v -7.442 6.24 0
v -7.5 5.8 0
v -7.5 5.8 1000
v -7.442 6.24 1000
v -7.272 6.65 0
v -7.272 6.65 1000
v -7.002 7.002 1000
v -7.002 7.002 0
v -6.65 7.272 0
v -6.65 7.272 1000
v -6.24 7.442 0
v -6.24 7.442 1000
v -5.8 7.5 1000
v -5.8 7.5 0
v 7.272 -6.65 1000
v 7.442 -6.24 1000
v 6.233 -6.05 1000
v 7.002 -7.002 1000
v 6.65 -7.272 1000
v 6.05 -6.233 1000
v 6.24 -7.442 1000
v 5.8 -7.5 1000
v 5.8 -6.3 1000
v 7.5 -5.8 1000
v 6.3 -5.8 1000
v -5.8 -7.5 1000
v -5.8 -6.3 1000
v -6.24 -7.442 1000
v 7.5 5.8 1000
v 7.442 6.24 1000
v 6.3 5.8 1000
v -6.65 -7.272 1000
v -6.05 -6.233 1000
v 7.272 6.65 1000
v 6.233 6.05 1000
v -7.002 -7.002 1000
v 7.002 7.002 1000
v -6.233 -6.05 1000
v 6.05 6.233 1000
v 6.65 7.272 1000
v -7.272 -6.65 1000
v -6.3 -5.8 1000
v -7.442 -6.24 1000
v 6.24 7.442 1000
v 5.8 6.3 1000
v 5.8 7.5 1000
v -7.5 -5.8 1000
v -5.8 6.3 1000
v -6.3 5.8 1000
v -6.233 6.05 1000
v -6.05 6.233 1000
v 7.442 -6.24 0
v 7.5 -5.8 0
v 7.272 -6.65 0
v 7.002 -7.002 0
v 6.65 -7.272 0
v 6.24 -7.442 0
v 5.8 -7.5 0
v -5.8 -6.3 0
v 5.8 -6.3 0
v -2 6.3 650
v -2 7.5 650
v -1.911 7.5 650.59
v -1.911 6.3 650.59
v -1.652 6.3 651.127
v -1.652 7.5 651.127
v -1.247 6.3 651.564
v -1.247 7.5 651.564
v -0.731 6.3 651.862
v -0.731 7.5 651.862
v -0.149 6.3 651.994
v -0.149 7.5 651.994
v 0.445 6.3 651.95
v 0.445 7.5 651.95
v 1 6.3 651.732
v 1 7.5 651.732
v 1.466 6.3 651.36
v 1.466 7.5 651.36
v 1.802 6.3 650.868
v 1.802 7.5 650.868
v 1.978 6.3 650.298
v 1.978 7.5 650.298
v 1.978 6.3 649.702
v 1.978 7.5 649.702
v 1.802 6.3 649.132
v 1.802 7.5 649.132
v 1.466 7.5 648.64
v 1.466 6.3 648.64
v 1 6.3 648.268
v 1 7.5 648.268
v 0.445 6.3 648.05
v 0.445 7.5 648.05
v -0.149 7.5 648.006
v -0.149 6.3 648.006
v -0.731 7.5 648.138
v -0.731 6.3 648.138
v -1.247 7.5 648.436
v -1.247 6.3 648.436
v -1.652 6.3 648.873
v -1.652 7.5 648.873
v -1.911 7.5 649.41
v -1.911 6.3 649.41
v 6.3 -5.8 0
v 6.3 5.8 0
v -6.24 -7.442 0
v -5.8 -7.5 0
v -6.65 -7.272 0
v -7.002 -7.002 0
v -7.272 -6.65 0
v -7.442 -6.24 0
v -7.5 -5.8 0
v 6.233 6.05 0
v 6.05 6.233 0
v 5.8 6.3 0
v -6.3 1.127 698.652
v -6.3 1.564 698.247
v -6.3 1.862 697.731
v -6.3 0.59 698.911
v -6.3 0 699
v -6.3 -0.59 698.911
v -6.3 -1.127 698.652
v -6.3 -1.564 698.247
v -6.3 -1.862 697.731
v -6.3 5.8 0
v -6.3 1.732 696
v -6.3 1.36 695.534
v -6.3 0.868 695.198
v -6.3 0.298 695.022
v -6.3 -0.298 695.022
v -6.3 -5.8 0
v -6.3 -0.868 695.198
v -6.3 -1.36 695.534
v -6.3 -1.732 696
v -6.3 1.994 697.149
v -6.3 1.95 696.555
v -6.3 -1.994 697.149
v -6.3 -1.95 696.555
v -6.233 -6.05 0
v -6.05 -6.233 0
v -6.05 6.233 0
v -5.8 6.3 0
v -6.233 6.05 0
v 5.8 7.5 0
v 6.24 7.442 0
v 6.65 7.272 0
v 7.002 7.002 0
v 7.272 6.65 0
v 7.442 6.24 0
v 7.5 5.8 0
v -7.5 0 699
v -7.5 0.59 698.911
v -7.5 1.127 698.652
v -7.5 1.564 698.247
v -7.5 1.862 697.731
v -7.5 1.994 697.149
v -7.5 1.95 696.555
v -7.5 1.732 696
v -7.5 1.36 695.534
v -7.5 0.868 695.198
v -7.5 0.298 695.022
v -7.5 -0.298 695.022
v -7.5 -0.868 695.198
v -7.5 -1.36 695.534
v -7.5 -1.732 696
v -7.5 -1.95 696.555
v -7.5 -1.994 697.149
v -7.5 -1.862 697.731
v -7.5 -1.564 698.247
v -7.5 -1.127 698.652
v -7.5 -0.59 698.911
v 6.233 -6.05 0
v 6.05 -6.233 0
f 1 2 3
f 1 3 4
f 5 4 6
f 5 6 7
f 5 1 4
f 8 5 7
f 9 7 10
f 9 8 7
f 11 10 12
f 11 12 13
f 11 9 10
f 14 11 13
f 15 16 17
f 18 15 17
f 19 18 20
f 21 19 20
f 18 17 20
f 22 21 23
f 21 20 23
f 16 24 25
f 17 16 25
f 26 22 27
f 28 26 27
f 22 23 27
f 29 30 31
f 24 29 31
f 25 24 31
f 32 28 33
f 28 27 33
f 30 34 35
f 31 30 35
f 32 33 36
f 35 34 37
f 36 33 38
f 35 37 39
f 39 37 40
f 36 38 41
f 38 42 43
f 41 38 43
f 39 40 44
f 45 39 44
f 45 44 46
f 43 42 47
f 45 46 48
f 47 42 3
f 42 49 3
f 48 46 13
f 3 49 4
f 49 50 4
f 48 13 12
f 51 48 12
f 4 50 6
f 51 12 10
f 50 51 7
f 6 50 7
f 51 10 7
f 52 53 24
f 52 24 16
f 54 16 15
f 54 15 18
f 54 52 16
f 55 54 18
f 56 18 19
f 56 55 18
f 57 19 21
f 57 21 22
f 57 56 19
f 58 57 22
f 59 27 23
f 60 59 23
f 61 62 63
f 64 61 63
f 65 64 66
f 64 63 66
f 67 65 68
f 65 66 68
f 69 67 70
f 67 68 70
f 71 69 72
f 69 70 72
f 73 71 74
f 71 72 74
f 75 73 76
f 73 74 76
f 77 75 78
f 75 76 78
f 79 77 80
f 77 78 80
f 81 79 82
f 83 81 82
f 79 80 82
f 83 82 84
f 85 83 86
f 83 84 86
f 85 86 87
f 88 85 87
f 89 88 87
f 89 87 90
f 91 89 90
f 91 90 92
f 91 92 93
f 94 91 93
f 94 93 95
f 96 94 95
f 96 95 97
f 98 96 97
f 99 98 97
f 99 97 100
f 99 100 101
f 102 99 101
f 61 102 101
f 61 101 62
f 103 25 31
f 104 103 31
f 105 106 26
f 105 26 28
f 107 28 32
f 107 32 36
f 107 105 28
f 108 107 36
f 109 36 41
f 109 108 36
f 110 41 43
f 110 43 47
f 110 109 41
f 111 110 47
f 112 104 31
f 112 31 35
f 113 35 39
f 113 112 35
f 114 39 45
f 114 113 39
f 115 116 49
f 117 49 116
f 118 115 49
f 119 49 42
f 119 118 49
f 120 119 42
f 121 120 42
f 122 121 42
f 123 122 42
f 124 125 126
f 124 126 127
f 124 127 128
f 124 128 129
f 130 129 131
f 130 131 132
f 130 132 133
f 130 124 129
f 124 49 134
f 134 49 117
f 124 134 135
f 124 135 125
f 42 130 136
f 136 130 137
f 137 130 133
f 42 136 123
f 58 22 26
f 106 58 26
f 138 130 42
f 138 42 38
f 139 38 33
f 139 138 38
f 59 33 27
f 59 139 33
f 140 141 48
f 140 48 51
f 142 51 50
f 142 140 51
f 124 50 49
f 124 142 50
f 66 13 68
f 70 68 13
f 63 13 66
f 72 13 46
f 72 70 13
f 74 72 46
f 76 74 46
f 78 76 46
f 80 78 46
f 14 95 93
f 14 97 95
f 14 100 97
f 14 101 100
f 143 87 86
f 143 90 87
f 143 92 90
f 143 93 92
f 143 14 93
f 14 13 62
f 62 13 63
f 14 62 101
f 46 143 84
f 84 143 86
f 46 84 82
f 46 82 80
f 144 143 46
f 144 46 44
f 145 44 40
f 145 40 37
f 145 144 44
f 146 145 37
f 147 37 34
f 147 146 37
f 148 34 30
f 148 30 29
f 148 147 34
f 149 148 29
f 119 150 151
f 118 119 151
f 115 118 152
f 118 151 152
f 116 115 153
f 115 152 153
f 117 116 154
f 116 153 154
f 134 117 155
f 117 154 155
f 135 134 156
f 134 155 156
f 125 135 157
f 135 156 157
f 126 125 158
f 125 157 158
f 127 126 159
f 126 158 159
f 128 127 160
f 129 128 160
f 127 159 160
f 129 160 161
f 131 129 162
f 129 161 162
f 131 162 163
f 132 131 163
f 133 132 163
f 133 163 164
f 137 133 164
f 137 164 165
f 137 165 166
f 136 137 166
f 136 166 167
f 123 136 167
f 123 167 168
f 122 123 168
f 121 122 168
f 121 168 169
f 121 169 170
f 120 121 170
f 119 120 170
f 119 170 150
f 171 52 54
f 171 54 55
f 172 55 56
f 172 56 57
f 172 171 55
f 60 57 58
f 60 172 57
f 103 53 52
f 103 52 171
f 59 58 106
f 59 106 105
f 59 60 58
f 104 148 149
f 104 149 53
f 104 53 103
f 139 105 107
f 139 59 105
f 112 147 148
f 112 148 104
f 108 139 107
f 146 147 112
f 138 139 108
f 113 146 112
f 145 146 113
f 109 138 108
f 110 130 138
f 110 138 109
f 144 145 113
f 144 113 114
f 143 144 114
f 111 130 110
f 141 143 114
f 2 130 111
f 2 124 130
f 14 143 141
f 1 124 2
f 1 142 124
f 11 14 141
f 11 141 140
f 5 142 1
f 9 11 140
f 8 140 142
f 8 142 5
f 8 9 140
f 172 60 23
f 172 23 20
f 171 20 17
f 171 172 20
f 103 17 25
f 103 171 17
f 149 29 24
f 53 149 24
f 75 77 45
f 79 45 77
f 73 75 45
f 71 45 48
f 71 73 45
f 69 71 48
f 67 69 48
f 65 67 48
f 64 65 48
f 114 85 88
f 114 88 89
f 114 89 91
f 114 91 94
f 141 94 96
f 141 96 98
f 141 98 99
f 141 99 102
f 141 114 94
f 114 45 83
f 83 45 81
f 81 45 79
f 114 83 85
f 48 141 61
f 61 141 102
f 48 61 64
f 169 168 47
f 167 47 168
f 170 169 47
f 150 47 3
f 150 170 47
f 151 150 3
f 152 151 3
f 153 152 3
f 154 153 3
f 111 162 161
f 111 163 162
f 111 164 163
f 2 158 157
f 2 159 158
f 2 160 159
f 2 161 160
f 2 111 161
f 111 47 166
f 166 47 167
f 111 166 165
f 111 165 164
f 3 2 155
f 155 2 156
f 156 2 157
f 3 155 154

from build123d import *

# Parameters (mm, degrees)
EXTRUDE1_DEPTH     = 1000
SKETCH2_R          = 2
CUT_EXTRUDE1_DEPTH = 2
SKETCH3_R          = 2
CUT_EXTRUDE2_DEPTH = 2


with BuildPart() as part:
    # Sketch1 → Extrude1 (new body)
    with BuildSketch(Plane.XY):
        with BuildLine():
            Line((-5.8, 7.5), (5.8, 7.5))
            ThreePointArc((5.8, 7.5), (7.002081528, 7.002081528), (7.5, 5.8))
            Line((7.5, 5.8), (7.5, -5.8))
            ThreePointArc((7.5, -5.8), (7.002081528, -7.002081528), (5.8, -7.5))
            Line((5.8, -7.5), (-5.8, -7.5))
            ThreePointArc((-5.8, -7.5), (-7.002081528, -7.002081528), (-7.5, -5.8))
            Line((-7.5, -5.8), (-7.5, 5.8))
            ThreePointArc((-7.5, 5.8), (-7.002081528, 7.002081528), (-5.8, 7.5))
        make_face()
        with BuildLine():
            Line((-6.3, 5.8), (-6.3, -5.8))
            ThreePointArc((-6.3, -5.8), (-6.153553391, -6.153553391), (-5.8, -6.3))
            Line((-5.8, -6.3), (5.8, -6.3))
            ThreePointArc((5.8, -6.3), (6.153553391, -6.153553391), (6.3, -5.8))
            Line((6.3, -5.8), (6.3, 5.8))
            ThreePointArc((6.3, 5.8), (6.153553391, 6.153553391), (5.8, 6.3))
            Line((5.8, 6.3), (-5.8, 6.3))
            ThreePointArc((-5.8, 6.3), (-6.153553391, 6.153553391), (-6.3, 5.8))
        make_face(mode=Mode.SUBTRACT)
    extrude(amount=EXTRUDE1_DEPTH)

    # Sketch2 → Cut-Extrude1 (cut)
    with BuildSketch(Plane.ZY.offset(7.5)):
        with Locations((697, 0)):
            Circle(SKETCH2_R)
    extrude(amount=-CUT_EXTRUDE1_DEPTH, mode=Mode.SUBTRACT)

    # Sketch3 → Cut-Extrude2 (cut)
    with BuildSketch(Plane(origin=(0, 7.5, 0), x_dir=(-1, 0, 0), z_dir=(0, 1, 0))):
        with Locations((0, 650)):
            Circle(SKETCH3_R)
    extrude(amount=-CUT_EXTRUDE2_DEPTH, mode=Mode.SUBTRACT)


solid = part.part
